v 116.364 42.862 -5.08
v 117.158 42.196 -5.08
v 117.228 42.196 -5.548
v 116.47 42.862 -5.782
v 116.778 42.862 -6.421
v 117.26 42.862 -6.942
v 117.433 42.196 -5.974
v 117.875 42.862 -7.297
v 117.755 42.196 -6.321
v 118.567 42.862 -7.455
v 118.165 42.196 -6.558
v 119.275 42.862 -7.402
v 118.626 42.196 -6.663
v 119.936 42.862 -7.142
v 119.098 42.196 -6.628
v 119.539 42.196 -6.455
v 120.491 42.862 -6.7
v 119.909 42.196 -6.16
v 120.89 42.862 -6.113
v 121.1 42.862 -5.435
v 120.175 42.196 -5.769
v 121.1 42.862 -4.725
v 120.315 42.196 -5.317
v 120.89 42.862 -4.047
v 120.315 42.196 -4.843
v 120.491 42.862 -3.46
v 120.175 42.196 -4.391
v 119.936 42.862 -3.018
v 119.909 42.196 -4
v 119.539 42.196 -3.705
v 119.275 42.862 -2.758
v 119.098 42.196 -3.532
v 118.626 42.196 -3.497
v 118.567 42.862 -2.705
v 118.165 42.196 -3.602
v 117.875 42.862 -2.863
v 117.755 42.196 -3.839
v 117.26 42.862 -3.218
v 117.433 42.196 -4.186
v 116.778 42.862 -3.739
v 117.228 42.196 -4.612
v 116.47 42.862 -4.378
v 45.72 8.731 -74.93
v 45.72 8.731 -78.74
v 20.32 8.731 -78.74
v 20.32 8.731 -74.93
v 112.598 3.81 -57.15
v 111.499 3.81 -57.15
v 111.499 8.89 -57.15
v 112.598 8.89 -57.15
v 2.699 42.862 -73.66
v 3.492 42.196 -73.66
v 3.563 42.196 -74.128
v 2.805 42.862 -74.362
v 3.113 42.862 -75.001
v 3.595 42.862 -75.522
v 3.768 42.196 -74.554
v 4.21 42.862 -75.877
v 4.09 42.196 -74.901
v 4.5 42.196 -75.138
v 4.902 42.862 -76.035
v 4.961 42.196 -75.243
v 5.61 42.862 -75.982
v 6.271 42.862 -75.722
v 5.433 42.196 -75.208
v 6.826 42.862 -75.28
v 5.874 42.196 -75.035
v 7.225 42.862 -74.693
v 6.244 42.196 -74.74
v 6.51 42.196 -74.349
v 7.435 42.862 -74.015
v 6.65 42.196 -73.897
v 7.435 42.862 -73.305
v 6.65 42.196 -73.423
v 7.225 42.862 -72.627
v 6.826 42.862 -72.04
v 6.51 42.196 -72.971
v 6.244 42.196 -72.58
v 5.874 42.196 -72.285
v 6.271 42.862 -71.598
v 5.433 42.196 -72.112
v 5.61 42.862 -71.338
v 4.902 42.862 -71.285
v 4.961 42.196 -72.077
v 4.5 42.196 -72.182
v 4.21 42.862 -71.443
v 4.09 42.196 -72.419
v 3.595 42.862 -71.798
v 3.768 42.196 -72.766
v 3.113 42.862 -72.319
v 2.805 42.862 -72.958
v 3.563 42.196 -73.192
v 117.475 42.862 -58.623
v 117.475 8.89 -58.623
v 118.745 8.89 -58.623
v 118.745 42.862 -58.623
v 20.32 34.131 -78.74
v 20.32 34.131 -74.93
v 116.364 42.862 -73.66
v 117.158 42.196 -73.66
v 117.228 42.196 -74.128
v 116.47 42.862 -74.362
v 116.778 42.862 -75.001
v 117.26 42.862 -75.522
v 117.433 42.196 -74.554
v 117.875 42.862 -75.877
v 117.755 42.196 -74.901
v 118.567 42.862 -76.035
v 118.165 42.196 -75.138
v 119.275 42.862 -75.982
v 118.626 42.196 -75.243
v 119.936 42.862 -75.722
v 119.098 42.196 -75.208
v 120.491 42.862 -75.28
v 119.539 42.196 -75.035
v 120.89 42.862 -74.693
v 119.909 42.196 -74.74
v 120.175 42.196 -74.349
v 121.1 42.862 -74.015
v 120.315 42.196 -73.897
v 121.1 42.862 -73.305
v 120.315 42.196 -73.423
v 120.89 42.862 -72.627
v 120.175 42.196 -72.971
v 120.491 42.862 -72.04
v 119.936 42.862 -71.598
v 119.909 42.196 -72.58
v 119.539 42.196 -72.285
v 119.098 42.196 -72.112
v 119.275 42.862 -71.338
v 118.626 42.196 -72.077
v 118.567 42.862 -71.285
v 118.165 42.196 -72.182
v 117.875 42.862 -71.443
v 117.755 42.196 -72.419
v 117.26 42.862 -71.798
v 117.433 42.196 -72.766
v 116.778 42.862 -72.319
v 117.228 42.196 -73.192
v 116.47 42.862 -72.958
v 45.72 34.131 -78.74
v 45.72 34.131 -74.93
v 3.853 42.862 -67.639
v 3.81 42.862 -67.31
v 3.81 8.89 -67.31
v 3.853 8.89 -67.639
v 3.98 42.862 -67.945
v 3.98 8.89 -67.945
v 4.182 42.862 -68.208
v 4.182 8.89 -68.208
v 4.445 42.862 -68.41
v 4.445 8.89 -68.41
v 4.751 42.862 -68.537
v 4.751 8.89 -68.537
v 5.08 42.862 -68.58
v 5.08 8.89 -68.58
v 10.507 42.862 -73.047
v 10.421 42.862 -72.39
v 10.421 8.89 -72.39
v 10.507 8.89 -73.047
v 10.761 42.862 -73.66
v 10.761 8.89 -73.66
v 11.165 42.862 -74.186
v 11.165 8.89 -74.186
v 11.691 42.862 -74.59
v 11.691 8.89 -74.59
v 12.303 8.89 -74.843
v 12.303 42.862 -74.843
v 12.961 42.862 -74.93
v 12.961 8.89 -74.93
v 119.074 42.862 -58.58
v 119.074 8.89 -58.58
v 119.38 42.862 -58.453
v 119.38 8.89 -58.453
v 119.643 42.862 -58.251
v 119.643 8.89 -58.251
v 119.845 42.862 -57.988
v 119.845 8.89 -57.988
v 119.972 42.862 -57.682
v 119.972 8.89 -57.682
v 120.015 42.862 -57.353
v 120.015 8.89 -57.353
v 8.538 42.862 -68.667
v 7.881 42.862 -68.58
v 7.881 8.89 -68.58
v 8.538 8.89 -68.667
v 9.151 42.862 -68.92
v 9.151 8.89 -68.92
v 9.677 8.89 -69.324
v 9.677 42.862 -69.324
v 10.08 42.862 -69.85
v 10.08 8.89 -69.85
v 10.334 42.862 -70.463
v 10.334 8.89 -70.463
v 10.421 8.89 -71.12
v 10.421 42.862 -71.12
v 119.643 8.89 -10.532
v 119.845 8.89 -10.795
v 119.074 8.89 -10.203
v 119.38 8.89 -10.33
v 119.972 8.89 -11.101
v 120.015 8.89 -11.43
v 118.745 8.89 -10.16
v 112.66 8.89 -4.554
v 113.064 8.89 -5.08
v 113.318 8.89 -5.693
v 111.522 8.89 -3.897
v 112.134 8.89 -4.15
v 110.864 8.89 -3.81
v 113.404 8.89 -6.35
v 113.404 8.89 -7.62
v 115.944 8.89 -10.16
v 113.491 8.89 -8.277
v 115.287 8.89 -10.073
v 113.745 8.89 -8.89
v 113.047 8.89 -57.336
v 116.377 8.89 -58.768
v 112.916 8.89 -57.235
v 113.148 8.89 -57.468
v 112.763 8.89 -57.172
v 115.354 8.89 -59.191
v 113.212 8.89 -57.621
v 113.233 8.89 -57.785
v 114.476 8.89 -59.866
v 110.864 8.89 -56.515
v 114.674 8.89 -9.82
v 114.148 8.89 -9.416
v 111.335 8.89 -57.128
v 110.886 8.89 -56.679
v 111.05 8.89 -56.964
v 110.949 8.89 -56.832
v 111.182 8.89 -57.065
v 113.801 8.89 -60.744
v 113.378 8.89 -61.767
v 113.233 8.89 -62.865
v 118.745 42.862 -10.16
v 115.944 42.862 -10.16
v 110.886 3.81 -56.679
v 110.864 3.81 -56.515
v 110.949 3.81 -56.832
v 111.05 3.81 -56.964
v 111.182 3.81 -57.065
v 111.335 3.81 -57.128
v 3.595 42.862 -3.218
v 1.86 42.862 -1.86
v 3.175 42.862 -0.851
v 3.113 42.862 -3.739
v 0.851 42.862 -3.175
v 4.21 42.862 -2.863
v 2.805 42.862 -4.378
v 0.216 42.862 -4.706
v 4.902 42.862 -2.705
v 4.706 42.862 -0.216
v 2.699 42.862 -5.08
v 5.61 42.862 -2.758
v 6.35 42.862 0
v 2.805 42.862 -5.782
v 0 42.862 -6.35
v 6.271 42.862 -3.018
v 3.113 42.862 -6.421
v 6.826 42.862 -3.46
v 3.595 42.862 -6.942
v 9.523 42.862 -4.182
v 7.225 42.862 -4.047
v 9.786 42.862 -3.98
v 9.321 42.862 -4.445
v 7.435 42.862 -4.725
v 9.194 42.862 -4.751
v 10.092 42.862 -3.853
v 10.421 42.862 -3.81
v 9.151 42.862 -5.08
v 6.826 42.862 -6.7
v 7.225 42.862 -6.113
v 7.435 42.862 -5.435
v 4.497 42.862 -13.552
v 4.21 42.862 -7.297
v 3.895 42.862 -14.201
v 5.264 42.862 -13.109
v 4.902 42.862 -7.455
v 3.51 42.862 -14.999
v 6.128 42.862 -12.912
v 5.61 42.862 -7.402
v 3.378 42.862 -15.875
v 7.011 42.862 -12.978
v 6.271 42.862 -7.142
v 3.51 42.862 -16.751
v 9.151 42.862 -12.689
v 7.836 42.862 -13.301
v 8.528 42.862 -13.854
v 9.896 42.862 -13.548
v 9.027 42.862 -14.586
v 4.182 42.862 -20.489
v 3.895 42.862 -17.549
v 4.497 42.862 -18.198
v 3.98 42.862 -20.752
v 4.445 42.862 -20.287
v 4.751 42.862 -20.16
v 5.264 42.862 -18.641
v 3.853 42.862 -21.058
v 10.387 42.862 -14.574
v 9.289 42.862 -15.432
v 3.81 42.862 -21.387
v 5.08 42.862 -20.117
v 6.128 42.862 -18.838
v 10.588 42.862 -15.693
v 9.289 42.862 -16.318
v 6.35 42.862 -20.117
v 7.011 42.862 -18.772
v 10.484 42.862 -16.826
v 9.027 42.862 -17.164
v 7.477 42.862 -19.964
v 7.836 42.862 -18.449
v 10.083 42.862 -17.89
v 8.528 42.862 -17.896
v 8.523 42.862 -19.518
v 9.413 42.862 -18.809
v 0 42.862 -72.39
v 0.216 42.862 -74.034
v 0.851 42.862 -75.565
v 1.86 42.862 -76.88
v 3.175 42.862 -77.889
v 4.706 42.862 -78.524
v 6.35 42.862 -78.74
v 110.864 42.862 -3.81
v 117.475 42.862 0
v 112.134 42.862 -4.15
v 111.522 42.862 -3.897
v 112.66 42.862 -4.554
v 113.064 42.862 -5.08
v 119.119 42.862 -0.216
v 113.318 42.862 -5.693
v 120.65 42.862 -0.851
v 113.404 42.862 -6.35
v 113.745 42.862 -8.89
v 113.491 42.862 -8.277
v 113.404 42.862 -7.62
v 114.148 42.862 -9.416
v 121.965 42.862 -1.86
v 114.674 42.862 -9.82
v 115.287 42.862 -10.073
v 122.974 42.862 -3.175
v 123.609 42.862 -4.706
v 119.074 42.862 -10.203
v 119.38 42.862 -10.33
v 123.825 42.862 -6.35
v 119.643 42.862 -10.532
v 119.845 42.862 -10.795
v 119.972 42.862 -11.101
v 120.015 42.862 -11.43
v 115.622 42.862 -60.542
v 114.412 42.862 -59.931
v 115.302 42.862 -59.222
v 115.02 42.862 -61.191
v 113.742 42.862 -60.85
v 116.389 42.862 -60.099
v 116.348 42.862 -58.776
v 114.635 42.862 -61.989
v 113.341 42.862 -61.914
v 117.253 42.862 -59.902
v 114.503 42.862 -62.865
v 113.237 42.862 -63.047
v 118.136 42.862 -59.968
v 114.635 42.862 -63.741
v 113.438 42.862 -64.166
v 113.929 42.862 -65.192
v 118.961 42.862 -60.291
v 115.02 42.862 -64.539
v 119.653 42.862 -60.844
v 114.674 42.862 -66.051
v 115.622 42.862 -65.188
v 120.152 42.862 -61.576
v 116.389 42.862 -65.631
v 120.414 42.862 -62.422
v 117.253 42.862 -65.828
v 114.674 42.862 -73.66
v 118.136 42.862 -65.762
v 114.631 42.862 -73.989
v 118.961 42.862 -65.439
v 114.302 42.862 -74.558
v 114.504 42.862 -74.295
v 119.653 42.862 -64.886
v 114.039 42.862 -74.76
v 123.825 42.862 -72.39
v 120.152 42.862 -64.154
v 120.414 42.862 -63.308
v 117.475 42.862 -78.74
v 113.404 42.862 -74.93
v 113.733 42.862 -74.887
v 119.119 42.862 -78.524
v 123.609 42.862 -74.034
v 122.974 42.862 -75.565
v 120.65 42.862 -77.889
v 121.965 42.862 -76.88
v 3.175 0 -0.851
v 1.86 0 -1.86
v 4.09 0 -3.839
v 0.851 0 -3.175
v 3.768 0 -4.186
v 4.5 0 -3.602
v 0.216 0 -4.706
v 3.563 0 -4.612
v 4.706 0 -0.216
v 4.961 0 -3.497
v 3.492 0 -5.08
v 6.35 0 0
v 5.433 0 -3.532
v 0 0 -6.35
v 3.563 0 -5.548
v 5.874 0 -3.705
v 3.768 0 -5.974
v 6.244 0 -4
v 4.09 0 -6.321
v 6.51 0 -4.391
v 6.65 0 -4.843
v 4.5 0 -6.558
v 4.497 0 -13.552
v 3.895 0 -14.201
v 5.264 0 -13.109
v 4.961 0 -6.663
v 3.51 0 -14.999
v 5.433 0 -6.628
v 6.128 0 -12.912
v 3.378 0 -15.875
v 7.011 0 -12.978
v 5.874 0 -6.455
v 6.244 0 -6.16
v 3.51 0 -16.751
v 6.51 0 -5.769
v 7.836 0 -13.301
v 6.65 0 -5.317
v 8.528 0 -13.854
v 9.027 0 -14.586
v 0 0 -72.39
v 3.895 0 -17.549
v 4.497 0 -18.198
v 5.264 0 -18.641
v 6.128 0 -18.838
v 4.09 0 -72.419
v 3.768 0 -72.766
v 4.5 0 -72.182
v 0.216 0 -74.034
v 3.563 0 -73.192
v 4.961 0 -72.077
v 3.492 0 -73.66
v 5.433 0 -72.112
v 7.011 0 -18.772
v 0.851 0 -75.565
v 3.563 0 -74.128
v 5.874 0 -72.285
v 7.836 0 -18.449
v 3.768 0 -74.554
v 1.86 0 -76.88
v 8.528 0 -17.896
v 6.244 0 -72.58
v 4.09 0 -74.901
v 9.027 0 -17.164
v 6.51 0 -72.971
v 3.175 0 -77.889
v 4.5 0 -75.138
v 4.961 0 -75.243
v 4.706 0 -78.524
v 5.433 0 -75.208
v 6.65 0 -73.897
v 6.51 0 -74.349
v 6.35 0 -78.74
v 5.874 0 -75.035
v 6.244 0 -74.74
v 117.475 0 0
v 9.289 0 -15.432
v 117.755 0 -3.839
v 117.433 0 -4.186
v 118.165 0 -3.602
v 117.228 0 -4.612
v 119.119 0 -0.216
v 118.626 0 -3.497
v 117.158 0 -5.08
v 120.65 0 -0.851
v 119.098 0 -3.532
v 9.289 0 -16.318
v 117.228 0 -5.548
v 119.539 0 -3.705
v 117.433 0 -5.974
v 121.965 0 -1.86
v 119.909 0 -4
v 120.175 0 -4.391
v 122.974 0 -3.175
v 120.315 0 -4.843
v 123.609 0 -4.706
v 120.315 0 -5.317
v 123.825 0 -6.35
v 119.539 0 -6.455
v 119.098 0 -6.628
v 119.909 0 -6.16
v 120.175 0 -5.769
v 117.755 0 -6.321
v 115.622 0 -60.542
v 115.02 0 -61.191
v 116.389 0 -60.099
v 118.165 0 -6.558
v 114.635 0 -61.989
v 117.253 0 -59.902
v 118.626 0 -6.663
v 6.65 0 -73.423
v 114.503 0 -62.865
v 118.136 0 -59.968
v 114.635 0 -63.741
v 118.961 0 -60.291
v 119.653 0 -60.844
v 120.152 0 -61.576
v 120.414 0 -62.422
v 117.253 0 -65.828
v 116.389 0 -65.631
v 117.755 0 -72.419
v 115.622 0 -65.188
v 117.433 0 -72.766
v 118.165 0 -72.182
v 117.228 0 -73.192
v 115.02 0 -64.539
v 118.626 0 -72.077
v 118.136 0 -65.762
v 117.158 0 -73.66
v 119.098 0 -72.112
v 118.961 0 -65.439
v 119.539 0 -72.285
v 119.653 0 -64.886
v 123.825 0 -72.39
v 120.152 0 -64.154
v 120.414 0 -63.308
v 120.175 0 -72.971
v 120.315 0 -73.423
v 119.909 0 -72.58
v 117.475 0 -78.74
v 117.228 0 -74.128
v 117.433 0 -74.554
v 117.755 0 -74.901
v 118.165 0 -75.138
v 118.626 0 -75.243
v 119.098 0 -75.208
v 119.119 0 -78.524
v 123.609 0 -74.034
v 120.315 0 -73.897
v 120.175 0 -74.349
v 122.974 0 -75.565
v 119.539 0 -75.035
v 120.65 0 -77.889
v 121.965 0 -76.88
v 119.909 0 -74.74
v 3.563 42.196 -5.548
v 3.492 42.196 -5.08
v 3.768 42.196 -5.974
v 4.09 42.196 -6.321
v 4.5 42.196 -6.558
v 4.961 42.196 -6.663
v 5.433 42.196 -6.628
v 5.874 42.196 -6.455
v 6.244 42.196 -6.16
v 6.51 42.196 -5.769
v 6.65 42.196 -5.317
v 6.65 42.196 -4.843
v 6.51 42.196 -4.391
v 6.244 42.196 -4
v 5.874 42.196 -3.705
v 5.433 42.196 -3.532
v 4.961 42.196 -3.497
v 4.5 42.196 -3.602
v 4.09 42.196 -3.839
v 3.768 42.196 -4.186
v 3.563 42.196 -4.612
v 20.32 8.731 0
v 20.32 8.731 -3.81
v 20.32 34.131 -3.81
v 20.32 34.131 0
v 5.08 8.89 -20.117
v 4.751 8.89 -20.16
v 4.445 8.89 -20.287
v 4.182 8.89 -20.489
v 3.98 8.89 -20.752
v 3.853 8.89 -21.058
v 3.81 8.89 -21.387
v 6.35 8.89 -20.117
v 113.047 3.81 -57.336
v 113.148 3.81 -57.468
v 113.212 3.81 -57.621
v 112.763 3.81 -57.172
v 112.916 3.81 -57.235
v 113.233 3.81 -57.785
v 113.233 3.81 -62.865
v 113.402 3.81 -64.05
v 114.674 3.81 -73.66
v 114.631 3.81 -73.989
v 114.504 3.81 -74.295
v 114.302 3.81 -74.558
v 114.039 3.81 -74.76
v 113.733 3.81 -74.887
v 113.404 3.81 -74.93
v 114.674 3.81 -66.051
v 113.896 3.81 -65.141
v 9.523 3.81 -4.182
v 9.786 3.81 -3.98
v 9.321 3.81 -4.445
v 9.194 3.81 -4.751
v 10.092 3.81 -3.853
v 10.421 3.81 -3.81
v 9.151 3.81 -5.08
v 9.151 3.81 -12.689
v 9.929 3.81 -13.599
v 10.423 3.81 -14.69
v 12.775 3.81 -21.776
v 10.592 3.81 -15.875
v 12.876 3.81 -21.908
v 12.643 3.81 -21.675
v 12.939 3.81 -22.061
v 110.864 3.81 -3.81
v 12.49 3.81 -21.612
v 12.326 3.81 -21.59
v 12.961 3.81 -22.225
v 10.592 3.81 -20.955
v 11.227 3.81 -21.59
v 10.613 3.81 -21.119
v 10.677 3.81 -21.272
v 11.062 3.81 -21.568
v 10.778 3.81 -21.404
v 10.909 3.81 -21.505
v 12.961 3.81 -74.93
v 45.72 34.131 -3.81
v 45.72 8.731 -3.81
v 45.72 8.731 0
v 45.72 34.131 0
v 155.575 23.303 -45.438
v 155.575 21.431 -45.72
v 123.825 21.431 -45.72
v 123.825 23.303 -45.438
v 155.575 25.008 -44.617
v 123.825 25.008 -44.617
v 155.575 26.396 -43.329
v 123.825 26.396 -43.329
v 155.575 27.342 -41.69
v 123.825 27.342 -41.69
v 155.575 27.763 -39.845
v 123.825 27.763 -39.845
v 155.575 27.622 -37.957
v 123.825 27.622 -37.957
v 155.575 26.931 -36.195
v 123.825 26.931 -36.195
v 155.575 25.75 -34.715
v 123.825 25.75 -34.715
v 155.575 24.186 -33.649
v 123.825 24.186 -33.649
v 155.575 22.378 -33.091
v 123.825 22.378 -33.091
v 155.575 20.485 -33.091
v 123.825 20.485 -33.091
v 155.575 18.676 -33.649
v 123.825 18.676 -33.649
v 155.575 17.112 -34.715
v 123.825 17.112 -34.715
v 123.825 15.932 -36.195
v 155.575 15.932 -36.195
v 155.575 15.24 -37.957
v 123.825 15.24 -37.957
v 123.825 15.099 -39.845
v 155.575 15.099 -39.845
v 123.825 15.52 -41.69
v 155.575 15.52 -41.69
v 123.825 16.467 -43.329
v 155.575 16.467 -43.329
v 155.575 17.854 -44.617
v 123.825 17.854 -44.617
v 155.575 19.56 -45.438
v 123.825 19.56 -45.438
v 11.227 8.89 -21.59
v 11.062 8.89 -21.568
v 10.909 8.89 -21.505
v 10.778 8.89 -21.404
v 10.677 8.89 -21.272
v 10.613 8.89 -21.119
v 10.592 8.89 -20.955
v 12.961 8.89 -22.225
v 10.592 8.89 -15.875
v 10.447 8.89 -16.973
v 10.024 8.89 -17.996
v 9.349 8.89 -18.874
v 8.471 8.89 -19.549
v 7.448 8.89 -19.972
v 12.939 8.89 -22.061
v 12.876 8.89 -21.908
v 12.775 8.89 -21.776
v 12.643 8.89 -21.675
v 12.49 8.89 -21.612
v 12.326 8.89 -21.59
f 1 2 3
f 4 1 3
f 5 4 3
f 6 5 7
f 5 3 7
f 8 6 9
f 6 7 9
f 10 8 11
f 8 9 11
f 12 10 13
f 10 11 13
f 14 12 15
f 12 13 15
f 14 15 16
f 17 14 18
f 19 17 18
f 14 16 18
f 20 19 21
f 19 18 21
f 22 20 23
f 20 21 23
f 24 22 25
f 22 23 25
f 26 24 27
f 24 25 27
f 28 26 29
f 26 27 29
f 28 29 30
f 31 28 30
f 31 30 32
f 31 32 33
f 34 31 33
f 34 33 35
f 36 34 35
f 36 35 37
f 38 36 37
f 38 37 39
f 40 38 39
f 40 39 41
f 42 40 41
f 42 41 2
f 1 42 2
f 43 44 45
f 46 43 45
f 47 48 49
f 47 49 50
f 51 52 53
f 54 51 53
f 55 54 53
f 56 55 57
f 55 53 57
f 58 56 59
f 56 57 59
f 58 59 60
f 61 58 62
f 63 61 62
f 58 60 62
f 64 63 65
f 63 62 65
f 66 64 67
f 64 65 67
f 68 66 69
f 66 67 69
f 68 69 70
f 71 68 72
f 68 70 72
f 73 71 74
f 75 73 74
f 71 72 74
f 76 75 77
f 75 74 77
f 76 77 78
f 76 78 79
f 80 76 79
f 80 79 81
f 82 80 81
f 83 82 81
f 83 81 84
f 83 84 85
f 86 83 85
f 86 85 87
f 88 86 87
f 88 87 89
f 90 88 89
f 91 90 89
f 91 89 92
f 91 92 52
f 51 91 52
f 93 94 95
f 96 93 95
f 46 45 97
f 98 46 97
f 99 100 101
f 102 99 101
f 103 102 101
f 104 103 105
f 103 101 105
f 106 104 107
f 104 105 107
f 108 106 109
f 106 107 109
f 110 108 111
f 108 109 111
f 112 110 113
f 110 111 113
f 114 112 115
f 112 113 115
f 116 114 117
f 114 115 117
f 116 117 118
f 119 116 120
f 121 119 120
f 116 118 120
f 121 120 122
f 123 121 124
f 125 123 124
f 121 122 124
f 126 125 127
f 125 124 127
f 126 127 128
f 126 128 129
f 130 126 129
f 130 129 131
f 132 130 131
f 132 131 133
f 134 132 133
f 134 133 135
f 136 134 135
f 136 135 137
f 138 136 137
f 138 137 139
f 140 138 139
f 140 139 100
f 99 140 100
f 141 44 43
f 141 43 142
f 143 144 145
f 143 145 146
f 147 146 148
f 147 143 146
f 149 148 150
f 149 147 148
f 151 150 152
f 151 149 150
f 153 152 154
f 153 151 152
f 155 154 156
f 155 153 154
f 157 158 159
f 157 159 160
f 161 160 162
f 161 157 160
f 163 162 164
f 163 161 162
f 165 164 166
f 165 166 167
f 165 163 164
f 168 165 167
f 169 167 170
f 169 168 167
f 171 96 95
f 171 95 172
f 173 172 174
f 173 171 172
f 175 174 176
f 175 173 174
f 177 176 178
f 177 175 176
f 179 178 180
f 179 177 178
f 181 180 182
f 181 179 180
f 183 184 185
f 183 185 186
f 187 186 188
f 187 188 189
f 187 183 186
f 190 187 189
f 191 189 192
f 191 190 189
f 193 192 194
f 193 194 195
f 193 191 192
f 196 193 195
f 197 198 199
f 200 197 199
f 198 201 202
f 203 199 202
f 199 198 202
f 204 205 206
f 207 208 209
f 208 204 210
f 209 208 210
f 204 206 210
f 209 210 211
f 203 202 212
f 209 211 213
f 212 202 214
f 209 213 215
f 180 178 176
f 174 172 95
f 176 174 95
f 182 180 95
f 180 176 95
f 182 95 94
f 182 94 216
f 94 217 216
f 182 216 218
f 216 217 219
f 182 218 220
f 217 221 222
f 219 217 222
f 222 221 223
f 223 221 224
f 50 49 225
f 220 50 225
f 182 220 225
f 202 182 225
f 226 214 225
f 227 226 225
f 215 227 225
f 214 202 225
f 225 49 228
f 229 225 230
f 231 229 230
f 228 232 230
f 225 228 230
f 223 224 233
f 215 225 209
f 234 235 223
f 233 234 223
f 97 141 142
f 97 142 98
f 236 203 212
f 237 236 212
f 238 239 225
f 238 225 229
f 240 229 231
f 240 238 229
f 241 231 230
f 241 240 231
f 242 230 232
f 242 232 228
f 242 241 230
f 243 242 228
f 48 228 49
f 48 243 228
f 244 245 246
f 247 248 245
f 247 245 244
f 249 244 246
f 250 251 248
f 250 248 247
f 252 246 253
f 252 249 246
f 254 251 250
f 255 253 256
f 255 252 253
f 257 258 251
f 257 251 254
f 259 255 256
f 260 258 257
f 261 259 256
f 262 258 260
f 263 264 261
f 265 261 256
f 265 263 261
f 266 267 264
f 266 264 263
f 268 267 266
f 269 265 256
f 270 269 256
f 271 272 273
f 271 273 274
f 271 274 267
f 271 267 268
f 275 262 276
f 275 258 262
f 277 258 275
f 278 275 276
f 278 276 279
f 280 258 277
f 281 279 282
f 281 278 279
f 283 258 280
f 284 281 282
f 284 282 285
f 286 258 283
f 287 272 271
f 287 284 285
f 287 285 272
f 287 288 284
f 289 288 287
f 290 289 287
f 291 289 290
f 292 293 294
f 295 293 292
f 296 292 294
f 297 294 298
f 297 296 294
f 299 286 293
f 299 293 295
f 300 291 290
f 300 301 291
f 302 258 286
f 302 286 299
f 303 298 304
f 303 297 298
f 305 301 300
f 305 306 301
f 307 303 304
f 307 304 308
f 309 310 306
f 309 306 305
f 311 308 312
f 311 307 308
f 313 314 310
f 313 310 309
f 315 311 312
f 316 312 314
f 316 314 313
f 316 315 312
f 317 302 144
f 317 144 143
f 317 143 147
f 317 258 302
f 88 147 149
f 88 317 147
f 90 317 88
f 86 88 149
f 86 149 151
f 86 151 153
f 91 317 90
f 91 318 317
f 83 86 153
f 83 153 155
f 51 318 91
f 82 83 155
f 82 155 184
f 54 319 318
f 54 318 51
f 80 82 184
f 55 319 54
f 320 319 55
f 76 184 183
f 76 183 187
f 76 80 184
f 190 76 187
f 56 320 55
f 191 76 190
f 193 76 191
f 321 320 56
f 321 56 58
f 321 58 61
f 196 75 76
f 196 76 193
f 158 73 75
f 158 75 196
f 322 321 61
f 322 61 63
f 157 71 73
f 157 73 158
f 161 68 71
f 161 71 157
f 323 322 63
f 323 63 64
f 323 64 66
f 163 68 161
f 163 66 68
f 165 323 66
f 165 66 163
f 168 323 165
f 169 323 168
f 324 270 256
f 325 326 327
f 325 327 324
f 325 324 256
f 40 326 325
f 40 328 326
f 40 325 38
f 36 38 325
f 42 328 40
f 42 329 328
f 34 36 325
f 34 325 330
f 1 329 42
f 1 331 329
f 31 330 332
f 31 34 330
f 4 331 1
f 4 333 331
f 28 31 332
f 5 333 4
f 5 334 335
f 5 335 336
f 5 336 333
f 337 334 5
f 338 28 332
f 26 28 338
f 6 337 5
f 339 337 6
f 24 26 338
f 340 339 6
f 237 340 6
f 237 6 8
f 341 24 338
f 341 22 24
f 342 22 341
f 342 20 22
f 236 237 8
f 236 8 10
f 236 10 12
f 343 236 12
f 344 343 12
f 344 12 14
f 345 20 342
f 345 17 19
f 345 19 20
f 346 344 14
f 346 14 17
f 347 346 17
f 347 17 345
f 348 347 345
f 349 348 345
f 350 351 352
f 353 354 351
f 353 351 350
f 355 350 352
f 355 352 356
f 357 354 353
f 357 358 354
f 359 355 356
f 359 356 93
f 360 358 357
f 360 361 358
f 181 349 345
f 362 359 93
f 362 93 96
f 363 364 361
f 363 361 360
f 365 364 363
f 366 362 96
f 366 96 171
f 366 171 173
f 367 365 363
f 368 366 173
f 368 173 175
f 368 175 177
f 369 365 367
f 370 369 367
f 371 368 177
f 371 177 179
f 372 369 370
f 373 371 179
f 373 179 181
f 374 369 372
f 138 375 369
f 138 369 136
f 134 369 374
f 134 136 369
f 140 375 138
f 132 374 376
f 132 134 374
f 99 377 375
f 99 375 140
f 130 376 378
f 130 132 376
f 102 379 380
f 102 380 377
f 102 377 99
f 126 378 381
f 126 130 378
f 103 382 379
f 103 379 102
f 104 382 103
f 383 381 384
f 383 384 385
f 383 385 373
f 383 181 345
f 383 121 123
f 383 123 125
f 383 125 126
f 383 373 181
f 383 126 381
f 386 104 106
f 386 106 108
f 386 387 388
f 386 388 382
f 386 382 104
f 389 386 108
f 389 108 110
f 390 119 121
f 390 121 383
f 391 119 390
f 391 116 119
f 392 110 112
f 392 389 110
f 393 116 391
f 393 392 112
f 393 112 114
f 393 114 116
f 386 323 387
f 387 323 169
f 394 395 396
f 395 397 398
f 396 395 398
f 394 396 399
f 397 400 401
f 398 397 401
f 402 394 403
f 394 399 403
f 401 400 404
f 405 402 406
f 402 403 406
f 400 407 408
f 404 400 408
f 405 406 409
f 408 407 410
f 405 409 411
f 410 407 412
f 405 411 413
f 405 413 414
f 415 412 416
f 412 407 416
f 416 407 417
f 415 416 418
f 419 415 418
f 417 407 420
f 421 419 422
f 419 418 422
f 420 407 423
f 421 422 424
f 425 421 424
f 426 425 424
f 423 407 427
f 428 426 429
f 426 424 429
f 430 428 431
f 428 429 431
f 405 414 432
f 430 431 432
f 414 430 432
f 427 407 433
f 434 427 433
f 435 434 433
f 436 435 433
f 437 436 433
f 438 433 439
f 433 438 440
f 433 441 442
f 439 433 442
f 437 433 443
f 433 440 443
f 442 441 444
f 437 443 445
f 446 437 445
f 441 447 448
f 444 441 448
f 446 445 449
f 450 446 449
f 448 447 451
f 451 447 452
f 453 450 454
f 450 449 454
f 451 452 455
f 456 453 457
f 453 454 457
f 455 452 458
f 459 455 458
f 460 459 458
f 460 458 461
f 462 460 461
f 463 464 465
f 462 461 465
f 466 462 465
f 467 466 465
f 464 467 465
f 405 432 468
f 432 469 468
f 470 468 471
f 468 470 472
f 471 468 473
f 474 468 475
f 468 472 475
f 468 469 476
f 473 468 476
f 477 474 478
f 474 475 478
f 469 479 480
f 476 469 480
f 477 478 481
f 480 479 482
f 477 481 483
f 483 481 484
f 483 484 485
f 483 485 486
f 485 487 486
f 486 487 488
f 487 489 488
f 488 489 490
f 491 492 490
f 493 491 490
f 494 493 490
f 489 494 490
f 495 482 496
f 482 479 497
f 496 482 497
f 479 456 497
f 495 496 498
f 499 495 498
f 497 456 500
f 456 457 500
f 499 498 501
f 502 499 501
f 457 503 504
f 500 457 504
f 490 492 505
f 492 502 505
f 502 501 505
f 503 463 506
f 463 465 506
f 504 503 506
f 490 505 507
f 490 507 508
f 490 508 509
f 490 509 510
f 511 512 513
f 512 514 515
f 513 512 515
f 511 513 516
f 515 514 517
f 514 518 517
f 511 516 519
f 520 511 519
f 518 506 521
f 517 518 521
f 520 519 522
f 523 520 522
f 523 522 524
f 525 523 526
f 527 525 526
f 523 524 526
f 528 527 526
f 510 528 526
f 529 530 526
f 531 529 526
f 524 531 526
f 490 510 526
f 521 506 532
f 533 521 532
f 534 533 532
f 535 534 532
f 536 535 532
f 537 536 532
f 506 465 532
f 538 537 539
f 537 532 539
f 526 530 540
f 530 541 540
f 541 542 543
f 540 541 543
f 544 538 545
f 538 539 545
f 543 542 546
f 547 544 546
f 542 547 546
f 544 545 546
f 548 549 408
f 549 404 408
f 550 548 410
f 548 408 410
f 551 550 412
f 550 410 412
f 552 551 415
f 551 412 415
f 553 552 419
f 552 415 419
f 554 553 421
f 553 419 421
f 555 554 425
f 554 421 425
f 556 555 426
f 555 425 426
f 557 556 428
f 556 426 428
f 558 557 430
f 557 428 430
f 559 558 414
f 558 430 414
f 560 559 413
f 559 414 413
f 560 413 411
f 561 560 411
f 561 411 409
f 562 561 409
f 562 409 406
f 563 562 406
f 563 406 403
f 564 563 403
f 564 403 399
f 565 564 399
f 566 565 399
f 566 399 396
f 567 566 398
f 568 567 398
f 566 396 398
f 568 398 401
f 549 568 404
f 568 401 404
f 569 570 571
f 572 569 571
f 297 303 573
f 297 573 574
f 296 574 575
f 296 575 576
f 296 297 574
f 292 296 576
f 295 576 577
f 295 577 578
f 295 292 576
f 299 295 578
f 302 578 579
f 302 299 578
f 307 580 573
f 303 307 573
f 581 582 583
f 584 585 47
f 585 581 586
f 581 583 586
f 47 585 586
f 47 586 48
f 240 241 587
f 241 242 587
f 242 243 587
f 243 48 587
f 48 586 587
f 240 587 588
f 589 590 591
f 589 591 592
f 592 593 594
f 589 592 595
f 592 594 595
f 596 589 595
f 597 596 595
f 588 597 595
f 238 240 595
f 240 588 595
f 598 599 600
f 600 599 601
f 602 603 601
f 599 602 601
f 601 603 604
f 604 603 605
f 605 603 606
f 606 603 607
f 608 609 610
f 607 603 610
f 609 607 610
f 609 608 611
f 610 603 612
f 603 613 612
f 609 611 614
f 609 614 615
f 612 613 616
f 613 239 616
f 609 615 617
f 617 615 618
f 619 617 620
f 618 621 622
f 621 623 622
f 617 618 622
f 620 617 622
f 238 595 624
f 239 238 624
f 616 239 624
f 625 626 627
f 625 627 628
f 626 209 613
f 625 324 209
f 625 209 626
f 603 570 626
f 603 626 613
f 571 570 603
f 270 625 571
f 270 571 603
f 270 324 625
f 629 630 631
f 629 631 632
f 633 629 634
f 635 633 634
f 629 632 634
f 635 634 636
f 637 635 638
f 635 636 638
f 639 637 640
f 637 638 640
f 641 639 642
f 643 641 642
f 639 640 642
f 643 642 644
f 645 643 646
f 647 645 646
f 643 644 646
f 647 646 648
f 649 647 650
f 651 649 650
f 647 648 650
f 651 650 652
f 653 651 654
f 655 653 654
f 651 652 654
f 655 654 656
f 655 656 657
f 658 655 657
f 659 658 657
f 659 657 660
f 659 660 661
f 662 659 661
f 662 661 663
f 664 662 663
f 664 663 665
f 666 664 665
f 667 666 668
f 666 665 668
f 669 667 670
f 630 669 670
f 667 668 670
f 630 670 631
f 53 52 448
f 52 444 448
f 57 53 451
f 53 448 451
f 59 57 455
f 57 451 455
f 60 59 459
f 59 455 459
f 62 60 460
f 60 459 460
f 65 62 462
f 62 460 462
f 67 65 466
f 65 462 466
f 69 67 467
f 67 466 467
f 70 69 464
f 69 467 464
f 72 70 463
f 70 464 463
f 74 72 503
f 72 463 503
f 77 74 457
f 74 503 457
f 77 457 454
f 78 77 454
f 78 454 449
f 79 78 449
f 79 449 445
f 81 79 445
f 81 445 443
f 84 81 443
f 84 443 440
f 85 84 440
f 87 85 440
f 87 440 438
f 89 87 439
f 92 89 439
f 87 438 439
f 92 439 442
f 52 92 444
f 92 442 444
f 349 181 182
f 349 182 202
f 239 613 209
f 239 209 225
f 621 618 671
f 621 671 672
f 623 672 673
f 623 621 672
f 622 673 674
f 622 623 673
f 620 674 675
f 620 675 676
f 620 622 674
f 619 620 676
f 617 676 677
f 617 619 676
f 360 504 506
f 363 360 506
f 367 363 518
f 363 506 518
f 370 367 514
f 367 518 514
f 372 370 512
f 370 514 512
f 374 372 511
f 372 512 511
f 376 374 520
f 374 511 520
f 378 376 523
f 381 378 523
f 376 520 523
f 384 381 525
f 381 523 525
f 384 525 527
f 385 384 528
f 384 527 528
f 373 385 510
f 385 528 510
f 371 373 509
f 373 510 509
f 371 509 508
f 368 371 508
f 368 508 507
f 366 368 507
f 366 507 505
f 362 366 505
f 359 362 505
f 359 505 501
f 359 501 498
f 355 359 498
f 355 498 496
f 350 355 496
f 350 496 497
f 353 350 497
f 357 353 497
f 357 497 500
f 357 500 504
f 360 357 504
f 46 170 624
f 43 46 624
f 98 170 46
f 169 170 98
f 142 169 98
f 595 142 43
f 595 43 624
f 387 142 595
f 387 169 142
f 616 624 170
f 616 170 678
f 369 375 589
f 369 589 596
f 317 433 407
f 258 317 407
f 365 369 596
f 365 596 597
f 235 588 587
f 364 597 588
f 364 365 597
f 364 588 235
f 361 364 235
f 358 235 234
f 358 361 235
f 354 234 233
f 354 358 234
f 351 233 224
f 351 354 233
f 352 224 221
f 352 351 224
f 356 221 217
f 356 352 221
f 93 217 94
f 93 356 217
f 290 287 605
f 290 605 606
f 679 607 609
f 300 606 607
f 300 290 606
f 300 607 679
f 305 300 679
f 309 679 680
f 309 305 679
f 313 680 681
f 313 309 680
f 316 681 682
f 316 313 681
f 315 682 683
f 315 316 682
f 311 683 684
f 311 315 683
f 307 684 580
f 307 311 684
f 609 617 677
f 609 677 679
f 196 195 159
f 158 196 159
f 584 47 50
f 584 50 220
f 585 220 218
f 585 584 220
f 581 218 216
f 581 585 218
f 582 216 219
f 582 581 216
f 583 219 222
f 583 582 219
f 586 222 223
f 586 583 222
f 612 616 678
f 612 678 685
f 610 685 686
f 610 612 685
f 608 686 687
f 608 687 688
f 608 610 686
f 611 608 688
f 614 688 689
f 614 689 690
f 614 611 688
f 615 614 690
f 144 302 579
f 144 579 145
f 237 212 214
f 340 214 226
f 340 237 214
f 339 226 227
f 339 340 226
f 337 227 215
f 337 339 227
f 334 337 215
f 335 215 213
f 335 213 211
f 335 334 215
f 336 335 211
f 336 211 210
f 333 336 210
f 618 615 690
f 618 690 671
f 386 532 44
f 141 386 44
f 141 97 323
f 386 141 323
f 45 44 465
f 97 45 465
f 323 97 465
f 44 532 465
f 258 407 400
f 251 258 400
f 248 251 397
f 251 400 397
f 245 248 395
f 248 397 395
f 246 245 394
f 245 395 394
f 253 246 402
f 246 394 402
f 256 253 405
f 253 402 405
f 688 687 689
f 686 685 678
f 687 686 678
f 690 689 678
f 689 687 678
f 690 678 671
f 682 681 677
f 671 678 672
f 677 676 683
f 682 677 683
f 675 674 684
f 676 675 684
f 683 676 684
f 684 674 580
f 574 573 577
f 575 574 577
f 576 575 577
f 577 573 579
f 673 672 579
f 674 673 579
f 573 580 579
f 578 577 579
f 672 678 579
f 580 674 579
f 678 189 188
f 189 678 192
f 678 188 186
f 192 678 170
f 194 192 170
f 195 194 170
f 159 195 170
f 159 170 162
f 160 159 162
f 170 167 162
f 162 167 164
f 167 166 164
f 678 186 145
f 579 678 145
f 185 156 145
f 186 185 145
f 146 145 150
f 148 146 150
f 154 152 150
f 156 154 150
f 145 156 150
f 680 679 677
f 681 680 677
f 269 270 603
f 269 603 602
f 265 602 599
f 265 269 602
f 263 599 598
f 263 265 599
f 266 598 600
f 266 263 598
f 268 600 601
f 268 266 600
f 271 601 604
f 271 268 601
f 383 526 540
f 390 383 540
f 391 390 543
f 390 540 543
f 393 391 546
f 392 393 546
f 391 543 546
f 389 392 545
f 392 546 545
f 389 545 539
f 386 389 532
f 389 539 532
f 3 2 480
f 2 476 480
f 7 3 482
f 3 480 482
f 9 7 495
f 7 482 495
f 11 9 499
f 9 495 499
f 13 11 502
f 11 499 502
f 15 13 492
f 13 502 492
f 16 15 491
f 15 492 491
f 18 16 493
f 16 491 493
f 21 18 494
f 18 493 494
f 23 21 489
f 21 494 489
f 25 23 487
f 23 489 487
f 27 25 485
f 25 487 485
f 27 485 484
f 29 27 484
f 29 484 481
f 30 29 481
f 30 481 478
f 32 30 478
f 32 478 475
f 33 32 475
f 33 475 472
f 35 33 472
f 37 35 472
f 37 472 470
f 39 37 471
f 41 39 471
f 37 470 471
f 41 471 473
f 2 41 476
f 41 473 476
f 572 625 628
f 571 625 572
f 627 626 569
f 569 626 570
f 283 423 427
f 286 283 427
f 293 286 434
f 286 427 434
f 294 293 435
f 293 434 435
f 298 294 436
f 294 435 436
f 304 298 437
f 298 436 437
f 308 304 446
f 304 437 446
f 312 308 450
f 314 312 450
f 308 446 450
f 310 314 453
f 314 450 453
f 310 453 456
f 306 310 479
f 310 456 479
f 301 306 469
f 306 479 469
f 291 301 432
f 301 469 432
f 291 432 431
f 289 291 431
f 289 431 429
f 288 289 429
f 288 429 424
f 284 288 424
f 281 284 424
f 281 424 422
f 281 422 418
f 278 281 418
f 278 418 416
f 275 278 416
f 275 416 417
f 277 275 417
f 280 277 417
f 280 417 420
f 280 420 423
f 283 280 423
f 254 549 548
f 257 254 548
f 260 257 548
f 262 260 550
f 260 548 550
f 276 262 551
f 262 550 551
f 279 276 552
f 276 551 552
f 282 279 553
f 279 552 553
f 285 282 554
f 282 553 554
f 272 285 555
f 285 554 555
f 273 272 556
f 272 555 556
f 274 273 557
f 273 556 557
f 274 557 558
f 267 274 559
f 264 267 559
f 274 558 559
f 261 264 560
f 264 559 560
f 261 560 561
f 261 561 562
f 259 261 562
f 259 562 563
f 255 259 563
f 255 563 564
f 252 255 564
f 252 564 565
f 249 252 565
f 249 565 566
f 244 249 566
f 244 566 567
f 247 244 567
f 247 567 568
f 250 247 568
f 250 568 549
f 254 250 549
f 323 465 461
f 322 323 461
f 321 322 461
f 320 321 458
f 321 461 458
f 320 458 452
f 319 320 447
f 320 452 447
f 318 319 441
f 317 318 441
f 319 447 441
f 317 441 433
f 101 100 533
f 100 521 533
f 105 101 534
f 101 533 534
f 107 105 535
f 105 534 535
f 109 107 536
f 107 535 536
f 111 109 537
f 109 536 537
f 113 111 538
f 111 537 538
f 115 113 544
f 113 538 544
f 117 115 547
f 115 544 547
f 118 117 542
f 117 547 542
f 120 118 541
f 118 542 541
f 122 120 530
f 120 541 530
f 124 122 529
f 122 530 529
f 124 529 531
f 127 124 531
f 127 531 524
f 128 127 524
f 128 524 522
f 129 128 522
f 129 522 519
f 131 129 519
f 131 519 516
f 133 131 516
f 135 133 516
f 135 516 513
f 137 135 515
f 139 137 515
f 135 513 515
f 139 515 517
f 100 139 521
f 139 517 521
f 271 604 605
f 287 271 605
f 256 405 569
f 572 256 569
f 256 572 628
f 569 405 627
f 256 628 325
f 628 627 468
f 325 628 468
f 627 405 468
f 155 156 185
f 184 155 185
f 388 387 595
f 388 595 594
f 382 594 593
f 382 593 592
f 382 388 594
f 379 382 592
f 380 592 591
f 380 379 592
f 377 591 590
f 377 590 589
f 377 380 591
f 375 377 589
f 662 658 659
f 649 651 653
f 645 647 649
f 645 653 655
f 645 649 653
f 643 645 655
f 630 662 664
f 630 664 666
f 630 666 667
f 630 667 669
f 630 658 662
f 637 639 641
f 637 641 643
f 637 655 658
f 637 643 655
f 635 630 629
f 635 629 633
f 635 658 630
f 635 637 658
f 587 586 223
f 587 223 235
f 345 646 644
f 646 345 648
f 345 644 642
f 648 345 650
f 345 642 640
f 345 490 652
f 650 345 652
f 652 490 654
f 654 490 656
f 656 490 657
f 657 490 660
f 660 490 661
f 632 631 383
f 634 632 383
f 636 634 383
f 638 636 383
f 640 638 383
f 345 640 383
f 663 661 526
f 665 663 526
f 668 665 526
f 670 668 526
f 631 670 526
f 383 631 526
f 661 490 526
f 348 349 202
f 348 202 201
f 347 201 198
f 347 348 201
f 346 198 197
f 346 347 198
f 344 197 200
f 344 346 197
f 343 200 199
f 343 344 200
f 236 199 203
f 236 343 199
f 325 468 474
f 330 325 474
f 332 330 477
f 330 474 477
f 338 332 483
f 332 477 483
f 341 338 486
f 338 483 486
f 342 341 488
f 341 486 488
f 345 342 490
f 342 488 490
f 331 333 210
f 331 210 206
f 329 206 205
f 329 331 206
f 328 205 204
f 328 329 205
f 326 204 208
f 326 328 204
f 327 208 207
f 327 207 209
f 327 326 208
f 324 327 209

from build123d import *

# Parameters (mm, degrees)
BOSS_EXTRUDE1_DEPTH                               = 42.8625
CSK_FOR_0_FLAT_HEAD_MACHINE_SCREW_100_D           = 3.175
CSK_FOR_0_FLAT_HEAD_MACHINE_SCREW_100_CSINK_D     = 4.7625
CSK_FOR_0_FLAT_HEAD_MACHINE_SCREW_100_CSINK_ANGLE = 100
A_0_234_DIAMETER_HOLE1_D                          = 5.9436
A_0_234_DIAMETER_HOLE1_DEPTH                      = 42.8625
CUT_EXTRUDE1_DEPTH                                = 39.0525
BOSS_EXTRUDE2_DEPTH                               = 5.08
SKETCH12_W                                        = 25.4
SKETCH12_H                                        = 25.4
CUT_EXTRUDE2_DEPTH                                = 79.74
SKETCH13_R                                        = 6.35
BOSS_EXTRUDE3_DEPTH                               = 31.75


with BuildPart() as part:
    # Sketch1 → Boss-Extrude1 (new body)
    with BuildSketch(Plane(origin=(0, 0, 0), x_dir=(1, 0, 0), z_dir=(0, 1, 0))):
        with BuildLine():
            Line((6.35, 0), (117.475, 0))
            ThreePointArc((117.475, 0), (121.965128061, 1.859871939), (123.825, 6.35))
            Line((123.825, 6.35), (123.825, 72.39))
            ThreePointArc((123.825, 72.39), (121.965128061, 76.880128061), (117.475, 78.74))
            Line((117.475, 78.74), (6.35, 78.74))
            ThreePointArc((6.35, 78.74), (1.859871939, 76.880128061), (0, 72.39))
            Line((0, 72.39), (0, 6.35))
            ThreePointArc((0, 6.35), (1.859871939, 1.859871939), (6.35, 0))
        make_face()
    extrude(amount=BOSS_EXTRUDE1_DEPTH)

    # CSK for #0 Flat Head Machine Screw (100)1 (through all)
    with Locations(Plane(origin=(0, 42.8625, 0), x_dir=(1, 0, 0), z_dir=(0, 1, 0))):
        with Locations((5.08, 5.08), (5.08, 73.66), (118.745, 73.66), (118.745, 5.08)):
            CounterSinkHole(CSK_FOR_0_FLAT_HEAD_MACHINE_SCREW_100_D / 2, CSK_FOR_0_FLAT_HEAD_MACHINE_SCREW_100_CSINK_D / 2, counter_sink_angle=CSK_FOR_0_FLAT_HEAD_MACHINE_SCREW_100_CSINK_ANGLE)

    # A (0.234) Diameter Hole1
    with Locations(Plane(origin=(0, 42.8625, 0), x_dir=(1, 0, 0), z_dir=(0, 1, 0))):
        with Locations((6.35, 15.875), (117.475, 62.865)):
            Hole(A_0_234_DIAMETER_HOLE1_D / 2, depth=A_0_234_DIAMETER_HOLE1_DEPTH)

    # Sketch9 → Cut-Extrude1 (cut)
    with BuildSketch(Plane(origin=(0, 42.8625, 0), x_dir=(1, 0, 0), z_dir=(0, 1, 0))):
        with BuildLine():
            Line((5.08, 68.58), (7.880598047, 68.58))
            ThreePointArc((7.880598047, 68.58), (9.676649271, 69.323948776), (10.420598047, 71.12))
            Line((10.420598047, 71.12), (10.420598047, 72.39))
            ThreePointArc((10.420598047, 72.39), (11.164546822, 74.186051224), (12.960598047, 74.93))
            Line((12.960598047, 74.93), (61.9125, 74.93))
            Line((61.9125, 74.93), (113.404401953, 74.93))
            ThreePointArc((113.404401953, 74.93), (114.302427566, 74.558025612), (114.674401953, 73.66))
            Line((114.674401953, 73.66), (114.674401953, 66.05083079))
            ThreePointArc((114.674401953, 66.05083079), (113.505962063, 61.368468979), (117.475, 58.6232))
            Line((117.475, 58.6232), (118.745, 58.6232))
            ThreePointArc((118.745, 58.6232), (119.643025612, 58.251225612), (120.015, 57.3532))
            Line((120.015, 57.3532), (120.015, 11.43))
            ThreePointArc((120.015, 11.43), (119.643025612, 10.531974388), (118.745, 10.16))
            Line((118.745, 10.16), (115.944401953, 10.16))
            ThreePointArc((115.944401953, 10.16), (114.148350729, 9.416051224), (113.404401953, 7.62))
            Line((113.404401953, 7.62), (113.404401953, 6.35))
            ThreePointArc((113.404401953, 6.35), (112.660453178, 4.553948776), (110.864401953, 3.81))
            Line((110.864401953, 3.81), (61.9125, 3.81))
            Line((61.9125, 3.81), (10.420598047, 3.81))
            ThreePointArc((10.420598047, 3.81), (9.522572434, 4.181974388), (9.150598047, 5.08))
            Line((9.150598047, 5.08), (9.150598047, 12.68916921))
            ThreePointArc((9.150598047, 12.68916921), (10.319037937, 17.371531021), (6.35, 20.1168))
            Line((6.35, 20.1168), (5.08, 20.1168))
            ThreePointArc((5.08, 20.1168), (4.181974388, 20.488774388), (3.81, 21.3868))
            Line((3.81, 21.3868), (3.81, 67.31))
            ThreePointArc((3.81, 67.31), (4.181974388, 68.208025612), (5.08, 68.58))
        make_face()
    extrude(amount=-CUT_EXTRUDE1_DEPTH, mode=Mode.SUBTRACT)

    # Sketch11 → Boss-Extrude2 (add)
    with BuildSketch(Plane(origin=(0, 3.81, 0), x_dir=(1, 0, 0), z_dir=(0, 1, 0))):
        with BuildLine():
            Line((12.960598047, 74.93), (12.960598047, 22.225))
            ThreePointArc((12.960598047, 22.225), (12.774610853, 21.775987194), (12.325598047, 21.59))
            Line((12.325598047, 21.59), (11.2268, 21.59))
            ThreePointArc((11.2268, 21.59), (10.777787194, 21.404012806), (10.5918, 20.955))
            Line((10.5918, 20.955), (10.5918, 15.875))
            ThreePointArc((10.5918, 15.875), (9.349405544, 18.874405544), (6.35, 20.1168))
            Line((6.35, 20.1168), (5.08, 20.1168))
            ThreePointArc((5.08, 20.1168), (4.181974388, 20.488774388), (3.81, 21.3868))
            Line((3.81, 21.3868), (3.81, 67.31))
            ThreePointArc((3.81, 67.31), (4.181974388, 68.208025612), (5.08, 68.58))
            Line((5.08, 68.58), (7.880598047, 68.58))
            ThreePointArc((7.880598047, 68.58), (9.676649271, 69.323948776), (10.420598047, 71.12))
            Line((10.420598047, 71.12), (10.420598047, 72.39))
            ThreePointArc((10.420598047, 72.39), (11.164546822, 74.186051224), (12.960598047, 74.93))
        make_face()
        with BuildLine():
            Line((110.864401953, 3.81), (110.864401953, 56.515))
            ThreePointArc((110.864401953, 56.515), (111.050389147, 56.964012806), (111.499401953, 57.15))
            Line((111.499401953, 57.15), (112.5982, 57.15))
            ThreePointArc((112.5982, 57.15), (113.047212806, 57.335987194), (113.2332, 57.785))
            Line((113.2332, 57.785), (113.2332, 62.865))
            ThreePointArc((113.2332, 62.865), (114.475594456, 59.865594456), (117.475, 58.6232))
            Line((117.475, 58.6232), (118.745, 58.6232))
            ThreePointArc((118.745, 58.6232), (119.643025612, 58.251225612), (120.015, 57.3532))
            Line((120.015, 57.3532), (120.015, 11.43))
            ThreePointArc((120.015, 11.43), (119.643025612, 10.531974388), (118.745, 10.16))
            Line((118.745, 10.16), (115.944401953, 10.16))
            ThreePointArc((115.944401953, 10.16), (114.148350729, 9.416051224), (113.404401953, 7.62))
            Line((113.404401953, 7.62), (113.404401953, 6.35))
            ThreePointArc((113.404401953, 6.35), (112.660453178, 4.553948776), (110.864401953, 3.81))
        make_face()
    extrude(amount=BOSS_EXTRUDE2_DEPTH)

    # Sketch12 → Cut-Extrude2 (cut, through all)
    with BuildSketch(Plane(origin=(0, 0, -78.74), x_dir=(-1, 0, 0), z_dir=(0, 0, -1))):
        with Locations((-33.02, 21.43125)):
            Rectangle(SKETCH12_W, SKETCH12_H)
    extrude(amount=-CUT_EXTRUDE2_DEPTH, mode=Mode.SUBTRACT)

    # Sketch13 → Boss-Extrude3 (add)
    with BuildSketch(Plane(origin=(123.825, 0, 0), x_dir=(0, 0, -1), z_dir=(1, 0, 0))):
        with Locations((39.37, 21.43125)):
            Circle(SKETCH13_R)
    extrude(amount=BOSS_EXTRUDE3_DEPTH)


solid = part.part
